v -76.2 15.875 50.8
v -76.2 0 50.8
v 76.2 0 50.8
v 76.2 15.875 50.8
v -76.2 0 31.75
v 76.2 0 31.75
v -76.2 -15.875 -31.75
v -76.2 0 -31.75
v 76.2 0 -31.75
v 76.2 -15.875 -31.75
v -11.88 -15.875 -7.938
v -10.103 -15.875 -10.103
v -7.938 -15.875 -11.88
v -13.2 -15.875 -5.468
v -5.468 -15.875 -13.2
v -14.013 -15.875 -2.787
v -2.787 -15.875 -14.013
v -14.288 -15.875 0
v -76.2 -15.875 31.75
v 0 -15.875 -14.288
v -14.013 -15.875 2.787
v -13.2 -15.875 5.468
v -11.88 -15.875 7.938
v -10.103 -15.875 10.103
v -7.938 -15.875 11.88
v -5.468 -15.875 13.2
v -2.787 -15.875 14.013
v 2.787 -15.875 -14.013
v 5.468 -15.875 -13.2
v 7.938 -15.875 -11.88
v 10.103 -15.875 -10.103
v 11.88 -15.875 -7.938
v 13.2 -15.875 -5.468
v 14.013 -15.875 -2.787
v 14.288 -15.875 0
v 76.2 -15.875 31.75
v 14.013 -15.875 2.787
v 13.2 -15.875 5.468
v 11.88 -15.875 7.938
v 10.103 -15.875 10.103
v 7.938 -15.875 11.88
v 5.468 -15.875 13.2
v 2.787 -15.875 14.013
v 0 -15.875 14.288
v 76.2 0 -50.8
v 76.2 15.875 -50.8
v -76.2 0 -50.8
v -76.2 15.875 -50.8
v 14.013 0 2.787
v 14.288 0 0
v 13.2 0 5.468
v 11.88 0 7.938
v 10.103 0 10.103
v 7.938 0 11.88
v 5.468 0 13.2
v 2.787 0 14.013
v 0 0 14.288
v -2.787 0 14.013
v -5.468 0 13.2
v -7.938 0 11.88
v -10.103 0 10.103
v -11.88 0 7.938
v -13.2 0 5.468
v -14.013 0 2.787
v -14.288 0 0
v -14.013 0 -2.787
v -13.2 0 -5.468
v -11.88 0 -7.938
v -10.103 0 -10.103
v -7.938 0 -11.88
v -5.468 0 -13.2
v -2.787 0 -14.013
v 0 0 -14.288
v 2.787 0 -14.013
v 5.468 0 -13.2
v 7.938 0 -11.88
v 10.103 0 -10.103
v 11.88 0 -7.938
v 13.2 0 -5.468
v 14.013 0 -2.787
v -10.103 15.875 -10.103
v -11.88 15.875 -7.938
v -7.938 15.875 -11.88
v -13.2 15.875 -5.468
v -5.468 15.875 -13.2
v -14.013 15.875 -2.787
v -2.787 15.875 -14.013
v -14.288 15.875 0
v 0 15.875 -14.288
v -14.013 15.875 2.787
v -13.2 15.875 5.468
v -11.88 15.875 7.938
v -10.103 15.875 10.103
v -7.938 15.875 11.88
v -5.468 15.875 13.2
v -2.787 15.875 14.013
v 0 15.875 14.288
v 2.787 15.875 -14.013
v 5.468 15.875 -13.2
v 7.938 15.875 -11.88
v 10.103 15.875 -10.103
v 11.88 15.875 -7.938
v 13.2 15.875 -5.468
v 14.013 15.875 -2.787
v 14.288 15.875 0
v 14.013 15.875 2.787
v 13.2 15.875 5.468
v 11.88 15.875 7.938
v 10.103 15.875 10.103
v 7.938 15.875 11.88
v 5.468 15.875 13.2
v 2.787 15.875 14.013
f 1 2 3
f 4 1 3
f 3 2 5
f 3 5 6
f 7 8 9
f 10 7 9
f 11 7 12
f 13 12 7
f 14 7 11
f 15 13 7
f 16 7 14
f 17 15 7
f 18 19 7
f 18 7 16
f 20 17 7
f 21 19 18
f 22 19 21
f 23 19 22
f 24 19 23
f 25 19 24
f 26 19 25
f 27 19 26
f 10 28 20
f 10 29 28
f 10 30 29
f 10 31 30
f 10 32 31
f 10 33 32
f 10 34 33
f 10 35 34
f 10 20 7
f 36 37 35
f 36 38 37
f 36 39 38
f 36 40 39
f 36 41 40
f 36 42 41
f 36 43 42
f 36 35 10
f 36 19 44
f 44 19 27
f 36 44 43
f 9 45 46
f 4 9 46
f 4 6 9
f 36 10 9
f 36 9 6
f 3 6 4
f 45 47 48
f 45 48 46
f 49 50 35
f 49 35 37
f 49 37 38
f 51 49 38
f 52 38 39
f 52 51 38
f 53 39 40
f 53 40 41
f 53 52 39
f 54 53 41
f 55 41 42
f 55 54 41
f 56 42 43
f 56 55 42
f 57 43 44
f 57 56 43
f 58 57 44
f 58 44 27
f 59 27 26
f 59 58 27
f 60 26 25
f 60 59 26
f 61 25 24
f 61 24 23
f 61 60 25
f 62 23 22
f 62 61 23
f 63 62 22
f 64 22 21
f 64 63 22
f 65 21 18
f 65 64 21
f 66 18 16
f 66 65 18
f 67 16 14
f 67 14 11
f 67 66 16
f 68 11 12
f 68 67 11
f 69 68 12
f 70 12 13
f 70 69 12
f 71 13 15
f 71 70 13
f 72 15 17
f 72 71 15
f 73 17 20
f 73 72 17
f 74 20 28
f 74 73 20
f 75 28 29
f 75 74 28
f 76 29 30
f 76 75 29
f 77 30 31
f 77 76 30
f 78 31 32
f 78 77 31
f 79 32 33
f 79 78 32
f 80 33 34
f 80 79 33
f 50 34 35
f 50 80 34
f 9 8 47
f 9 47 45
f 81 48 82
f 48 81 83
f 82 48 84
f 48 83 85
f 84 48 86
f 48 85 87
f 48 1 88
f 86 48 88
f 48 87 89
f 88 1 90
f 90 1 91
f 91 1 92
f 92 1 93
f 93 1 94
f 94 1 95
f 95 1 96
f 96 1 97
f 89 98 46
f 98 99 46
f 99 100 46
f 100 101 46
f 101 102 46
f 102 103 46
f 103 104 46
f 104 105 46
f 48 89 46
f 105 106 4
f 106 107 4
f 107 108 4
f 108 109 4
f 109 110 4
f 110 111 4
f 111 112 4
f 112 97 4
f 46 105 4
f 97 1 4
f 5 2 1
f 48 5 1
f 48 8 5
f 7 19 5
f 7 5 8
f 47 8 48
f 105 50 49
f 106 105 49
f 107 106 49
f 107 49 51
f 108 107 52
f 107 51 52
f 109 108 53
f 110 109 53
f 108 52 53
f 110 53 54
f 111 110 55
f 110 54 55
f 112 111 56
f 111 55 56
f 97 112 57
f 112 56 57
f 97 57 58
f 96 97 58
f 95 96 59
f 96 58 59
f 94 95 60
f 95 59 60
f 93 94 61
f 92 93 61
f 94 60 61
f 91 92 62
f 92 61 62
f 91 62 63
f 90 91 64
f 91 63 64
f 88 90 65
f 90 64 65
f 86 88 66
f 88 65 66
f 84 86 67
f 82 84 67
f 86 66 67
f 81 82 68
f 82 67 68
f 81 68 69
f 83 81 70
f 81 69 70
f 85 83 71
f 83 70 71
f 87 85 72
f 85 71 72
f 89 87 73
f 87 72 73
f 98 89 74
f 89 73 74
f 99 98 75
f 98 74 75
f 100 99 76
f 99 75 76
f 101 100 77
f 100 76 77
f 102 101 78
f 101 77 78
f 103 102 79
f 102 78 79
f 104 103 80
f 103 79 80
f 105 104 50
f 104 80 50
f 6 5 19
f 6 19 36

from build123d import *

# Parameters (mm, degrees)
F0_W     = 152.4
F0_H     = 63.5
F0_R     = 14.2875
F1_DEPTH = 15.875
F0_H_2   = 19.05
F2_DEPTH = 15.875


with BuildPart() as f1:
    # F0 (on Front) → F1 (new body)
    with BuildSketch(Plane.XZ):
        Rectangle(F0_W, F0_H)
        Circle(F0_R, mode=Mode.SUBTRACT)
    extrude(amount=F1_DEPTH)

    # F0 (on Front) → F2 (join)
    with BuildSketch(Plane.XZ):
        with Locations((0, 41.275)):
            Rectangle(F0_W, F0_H_2)
        Rectangle(F0_W, F0_H)
        Circle(F0_R, mode=Mode.SUBTRACT)
        with Locations((0, -41.275)):
            Rectangle(F0_W, F0_H_2)
    extrude(amount=-F2_DEPTH)


solid = f1.part
